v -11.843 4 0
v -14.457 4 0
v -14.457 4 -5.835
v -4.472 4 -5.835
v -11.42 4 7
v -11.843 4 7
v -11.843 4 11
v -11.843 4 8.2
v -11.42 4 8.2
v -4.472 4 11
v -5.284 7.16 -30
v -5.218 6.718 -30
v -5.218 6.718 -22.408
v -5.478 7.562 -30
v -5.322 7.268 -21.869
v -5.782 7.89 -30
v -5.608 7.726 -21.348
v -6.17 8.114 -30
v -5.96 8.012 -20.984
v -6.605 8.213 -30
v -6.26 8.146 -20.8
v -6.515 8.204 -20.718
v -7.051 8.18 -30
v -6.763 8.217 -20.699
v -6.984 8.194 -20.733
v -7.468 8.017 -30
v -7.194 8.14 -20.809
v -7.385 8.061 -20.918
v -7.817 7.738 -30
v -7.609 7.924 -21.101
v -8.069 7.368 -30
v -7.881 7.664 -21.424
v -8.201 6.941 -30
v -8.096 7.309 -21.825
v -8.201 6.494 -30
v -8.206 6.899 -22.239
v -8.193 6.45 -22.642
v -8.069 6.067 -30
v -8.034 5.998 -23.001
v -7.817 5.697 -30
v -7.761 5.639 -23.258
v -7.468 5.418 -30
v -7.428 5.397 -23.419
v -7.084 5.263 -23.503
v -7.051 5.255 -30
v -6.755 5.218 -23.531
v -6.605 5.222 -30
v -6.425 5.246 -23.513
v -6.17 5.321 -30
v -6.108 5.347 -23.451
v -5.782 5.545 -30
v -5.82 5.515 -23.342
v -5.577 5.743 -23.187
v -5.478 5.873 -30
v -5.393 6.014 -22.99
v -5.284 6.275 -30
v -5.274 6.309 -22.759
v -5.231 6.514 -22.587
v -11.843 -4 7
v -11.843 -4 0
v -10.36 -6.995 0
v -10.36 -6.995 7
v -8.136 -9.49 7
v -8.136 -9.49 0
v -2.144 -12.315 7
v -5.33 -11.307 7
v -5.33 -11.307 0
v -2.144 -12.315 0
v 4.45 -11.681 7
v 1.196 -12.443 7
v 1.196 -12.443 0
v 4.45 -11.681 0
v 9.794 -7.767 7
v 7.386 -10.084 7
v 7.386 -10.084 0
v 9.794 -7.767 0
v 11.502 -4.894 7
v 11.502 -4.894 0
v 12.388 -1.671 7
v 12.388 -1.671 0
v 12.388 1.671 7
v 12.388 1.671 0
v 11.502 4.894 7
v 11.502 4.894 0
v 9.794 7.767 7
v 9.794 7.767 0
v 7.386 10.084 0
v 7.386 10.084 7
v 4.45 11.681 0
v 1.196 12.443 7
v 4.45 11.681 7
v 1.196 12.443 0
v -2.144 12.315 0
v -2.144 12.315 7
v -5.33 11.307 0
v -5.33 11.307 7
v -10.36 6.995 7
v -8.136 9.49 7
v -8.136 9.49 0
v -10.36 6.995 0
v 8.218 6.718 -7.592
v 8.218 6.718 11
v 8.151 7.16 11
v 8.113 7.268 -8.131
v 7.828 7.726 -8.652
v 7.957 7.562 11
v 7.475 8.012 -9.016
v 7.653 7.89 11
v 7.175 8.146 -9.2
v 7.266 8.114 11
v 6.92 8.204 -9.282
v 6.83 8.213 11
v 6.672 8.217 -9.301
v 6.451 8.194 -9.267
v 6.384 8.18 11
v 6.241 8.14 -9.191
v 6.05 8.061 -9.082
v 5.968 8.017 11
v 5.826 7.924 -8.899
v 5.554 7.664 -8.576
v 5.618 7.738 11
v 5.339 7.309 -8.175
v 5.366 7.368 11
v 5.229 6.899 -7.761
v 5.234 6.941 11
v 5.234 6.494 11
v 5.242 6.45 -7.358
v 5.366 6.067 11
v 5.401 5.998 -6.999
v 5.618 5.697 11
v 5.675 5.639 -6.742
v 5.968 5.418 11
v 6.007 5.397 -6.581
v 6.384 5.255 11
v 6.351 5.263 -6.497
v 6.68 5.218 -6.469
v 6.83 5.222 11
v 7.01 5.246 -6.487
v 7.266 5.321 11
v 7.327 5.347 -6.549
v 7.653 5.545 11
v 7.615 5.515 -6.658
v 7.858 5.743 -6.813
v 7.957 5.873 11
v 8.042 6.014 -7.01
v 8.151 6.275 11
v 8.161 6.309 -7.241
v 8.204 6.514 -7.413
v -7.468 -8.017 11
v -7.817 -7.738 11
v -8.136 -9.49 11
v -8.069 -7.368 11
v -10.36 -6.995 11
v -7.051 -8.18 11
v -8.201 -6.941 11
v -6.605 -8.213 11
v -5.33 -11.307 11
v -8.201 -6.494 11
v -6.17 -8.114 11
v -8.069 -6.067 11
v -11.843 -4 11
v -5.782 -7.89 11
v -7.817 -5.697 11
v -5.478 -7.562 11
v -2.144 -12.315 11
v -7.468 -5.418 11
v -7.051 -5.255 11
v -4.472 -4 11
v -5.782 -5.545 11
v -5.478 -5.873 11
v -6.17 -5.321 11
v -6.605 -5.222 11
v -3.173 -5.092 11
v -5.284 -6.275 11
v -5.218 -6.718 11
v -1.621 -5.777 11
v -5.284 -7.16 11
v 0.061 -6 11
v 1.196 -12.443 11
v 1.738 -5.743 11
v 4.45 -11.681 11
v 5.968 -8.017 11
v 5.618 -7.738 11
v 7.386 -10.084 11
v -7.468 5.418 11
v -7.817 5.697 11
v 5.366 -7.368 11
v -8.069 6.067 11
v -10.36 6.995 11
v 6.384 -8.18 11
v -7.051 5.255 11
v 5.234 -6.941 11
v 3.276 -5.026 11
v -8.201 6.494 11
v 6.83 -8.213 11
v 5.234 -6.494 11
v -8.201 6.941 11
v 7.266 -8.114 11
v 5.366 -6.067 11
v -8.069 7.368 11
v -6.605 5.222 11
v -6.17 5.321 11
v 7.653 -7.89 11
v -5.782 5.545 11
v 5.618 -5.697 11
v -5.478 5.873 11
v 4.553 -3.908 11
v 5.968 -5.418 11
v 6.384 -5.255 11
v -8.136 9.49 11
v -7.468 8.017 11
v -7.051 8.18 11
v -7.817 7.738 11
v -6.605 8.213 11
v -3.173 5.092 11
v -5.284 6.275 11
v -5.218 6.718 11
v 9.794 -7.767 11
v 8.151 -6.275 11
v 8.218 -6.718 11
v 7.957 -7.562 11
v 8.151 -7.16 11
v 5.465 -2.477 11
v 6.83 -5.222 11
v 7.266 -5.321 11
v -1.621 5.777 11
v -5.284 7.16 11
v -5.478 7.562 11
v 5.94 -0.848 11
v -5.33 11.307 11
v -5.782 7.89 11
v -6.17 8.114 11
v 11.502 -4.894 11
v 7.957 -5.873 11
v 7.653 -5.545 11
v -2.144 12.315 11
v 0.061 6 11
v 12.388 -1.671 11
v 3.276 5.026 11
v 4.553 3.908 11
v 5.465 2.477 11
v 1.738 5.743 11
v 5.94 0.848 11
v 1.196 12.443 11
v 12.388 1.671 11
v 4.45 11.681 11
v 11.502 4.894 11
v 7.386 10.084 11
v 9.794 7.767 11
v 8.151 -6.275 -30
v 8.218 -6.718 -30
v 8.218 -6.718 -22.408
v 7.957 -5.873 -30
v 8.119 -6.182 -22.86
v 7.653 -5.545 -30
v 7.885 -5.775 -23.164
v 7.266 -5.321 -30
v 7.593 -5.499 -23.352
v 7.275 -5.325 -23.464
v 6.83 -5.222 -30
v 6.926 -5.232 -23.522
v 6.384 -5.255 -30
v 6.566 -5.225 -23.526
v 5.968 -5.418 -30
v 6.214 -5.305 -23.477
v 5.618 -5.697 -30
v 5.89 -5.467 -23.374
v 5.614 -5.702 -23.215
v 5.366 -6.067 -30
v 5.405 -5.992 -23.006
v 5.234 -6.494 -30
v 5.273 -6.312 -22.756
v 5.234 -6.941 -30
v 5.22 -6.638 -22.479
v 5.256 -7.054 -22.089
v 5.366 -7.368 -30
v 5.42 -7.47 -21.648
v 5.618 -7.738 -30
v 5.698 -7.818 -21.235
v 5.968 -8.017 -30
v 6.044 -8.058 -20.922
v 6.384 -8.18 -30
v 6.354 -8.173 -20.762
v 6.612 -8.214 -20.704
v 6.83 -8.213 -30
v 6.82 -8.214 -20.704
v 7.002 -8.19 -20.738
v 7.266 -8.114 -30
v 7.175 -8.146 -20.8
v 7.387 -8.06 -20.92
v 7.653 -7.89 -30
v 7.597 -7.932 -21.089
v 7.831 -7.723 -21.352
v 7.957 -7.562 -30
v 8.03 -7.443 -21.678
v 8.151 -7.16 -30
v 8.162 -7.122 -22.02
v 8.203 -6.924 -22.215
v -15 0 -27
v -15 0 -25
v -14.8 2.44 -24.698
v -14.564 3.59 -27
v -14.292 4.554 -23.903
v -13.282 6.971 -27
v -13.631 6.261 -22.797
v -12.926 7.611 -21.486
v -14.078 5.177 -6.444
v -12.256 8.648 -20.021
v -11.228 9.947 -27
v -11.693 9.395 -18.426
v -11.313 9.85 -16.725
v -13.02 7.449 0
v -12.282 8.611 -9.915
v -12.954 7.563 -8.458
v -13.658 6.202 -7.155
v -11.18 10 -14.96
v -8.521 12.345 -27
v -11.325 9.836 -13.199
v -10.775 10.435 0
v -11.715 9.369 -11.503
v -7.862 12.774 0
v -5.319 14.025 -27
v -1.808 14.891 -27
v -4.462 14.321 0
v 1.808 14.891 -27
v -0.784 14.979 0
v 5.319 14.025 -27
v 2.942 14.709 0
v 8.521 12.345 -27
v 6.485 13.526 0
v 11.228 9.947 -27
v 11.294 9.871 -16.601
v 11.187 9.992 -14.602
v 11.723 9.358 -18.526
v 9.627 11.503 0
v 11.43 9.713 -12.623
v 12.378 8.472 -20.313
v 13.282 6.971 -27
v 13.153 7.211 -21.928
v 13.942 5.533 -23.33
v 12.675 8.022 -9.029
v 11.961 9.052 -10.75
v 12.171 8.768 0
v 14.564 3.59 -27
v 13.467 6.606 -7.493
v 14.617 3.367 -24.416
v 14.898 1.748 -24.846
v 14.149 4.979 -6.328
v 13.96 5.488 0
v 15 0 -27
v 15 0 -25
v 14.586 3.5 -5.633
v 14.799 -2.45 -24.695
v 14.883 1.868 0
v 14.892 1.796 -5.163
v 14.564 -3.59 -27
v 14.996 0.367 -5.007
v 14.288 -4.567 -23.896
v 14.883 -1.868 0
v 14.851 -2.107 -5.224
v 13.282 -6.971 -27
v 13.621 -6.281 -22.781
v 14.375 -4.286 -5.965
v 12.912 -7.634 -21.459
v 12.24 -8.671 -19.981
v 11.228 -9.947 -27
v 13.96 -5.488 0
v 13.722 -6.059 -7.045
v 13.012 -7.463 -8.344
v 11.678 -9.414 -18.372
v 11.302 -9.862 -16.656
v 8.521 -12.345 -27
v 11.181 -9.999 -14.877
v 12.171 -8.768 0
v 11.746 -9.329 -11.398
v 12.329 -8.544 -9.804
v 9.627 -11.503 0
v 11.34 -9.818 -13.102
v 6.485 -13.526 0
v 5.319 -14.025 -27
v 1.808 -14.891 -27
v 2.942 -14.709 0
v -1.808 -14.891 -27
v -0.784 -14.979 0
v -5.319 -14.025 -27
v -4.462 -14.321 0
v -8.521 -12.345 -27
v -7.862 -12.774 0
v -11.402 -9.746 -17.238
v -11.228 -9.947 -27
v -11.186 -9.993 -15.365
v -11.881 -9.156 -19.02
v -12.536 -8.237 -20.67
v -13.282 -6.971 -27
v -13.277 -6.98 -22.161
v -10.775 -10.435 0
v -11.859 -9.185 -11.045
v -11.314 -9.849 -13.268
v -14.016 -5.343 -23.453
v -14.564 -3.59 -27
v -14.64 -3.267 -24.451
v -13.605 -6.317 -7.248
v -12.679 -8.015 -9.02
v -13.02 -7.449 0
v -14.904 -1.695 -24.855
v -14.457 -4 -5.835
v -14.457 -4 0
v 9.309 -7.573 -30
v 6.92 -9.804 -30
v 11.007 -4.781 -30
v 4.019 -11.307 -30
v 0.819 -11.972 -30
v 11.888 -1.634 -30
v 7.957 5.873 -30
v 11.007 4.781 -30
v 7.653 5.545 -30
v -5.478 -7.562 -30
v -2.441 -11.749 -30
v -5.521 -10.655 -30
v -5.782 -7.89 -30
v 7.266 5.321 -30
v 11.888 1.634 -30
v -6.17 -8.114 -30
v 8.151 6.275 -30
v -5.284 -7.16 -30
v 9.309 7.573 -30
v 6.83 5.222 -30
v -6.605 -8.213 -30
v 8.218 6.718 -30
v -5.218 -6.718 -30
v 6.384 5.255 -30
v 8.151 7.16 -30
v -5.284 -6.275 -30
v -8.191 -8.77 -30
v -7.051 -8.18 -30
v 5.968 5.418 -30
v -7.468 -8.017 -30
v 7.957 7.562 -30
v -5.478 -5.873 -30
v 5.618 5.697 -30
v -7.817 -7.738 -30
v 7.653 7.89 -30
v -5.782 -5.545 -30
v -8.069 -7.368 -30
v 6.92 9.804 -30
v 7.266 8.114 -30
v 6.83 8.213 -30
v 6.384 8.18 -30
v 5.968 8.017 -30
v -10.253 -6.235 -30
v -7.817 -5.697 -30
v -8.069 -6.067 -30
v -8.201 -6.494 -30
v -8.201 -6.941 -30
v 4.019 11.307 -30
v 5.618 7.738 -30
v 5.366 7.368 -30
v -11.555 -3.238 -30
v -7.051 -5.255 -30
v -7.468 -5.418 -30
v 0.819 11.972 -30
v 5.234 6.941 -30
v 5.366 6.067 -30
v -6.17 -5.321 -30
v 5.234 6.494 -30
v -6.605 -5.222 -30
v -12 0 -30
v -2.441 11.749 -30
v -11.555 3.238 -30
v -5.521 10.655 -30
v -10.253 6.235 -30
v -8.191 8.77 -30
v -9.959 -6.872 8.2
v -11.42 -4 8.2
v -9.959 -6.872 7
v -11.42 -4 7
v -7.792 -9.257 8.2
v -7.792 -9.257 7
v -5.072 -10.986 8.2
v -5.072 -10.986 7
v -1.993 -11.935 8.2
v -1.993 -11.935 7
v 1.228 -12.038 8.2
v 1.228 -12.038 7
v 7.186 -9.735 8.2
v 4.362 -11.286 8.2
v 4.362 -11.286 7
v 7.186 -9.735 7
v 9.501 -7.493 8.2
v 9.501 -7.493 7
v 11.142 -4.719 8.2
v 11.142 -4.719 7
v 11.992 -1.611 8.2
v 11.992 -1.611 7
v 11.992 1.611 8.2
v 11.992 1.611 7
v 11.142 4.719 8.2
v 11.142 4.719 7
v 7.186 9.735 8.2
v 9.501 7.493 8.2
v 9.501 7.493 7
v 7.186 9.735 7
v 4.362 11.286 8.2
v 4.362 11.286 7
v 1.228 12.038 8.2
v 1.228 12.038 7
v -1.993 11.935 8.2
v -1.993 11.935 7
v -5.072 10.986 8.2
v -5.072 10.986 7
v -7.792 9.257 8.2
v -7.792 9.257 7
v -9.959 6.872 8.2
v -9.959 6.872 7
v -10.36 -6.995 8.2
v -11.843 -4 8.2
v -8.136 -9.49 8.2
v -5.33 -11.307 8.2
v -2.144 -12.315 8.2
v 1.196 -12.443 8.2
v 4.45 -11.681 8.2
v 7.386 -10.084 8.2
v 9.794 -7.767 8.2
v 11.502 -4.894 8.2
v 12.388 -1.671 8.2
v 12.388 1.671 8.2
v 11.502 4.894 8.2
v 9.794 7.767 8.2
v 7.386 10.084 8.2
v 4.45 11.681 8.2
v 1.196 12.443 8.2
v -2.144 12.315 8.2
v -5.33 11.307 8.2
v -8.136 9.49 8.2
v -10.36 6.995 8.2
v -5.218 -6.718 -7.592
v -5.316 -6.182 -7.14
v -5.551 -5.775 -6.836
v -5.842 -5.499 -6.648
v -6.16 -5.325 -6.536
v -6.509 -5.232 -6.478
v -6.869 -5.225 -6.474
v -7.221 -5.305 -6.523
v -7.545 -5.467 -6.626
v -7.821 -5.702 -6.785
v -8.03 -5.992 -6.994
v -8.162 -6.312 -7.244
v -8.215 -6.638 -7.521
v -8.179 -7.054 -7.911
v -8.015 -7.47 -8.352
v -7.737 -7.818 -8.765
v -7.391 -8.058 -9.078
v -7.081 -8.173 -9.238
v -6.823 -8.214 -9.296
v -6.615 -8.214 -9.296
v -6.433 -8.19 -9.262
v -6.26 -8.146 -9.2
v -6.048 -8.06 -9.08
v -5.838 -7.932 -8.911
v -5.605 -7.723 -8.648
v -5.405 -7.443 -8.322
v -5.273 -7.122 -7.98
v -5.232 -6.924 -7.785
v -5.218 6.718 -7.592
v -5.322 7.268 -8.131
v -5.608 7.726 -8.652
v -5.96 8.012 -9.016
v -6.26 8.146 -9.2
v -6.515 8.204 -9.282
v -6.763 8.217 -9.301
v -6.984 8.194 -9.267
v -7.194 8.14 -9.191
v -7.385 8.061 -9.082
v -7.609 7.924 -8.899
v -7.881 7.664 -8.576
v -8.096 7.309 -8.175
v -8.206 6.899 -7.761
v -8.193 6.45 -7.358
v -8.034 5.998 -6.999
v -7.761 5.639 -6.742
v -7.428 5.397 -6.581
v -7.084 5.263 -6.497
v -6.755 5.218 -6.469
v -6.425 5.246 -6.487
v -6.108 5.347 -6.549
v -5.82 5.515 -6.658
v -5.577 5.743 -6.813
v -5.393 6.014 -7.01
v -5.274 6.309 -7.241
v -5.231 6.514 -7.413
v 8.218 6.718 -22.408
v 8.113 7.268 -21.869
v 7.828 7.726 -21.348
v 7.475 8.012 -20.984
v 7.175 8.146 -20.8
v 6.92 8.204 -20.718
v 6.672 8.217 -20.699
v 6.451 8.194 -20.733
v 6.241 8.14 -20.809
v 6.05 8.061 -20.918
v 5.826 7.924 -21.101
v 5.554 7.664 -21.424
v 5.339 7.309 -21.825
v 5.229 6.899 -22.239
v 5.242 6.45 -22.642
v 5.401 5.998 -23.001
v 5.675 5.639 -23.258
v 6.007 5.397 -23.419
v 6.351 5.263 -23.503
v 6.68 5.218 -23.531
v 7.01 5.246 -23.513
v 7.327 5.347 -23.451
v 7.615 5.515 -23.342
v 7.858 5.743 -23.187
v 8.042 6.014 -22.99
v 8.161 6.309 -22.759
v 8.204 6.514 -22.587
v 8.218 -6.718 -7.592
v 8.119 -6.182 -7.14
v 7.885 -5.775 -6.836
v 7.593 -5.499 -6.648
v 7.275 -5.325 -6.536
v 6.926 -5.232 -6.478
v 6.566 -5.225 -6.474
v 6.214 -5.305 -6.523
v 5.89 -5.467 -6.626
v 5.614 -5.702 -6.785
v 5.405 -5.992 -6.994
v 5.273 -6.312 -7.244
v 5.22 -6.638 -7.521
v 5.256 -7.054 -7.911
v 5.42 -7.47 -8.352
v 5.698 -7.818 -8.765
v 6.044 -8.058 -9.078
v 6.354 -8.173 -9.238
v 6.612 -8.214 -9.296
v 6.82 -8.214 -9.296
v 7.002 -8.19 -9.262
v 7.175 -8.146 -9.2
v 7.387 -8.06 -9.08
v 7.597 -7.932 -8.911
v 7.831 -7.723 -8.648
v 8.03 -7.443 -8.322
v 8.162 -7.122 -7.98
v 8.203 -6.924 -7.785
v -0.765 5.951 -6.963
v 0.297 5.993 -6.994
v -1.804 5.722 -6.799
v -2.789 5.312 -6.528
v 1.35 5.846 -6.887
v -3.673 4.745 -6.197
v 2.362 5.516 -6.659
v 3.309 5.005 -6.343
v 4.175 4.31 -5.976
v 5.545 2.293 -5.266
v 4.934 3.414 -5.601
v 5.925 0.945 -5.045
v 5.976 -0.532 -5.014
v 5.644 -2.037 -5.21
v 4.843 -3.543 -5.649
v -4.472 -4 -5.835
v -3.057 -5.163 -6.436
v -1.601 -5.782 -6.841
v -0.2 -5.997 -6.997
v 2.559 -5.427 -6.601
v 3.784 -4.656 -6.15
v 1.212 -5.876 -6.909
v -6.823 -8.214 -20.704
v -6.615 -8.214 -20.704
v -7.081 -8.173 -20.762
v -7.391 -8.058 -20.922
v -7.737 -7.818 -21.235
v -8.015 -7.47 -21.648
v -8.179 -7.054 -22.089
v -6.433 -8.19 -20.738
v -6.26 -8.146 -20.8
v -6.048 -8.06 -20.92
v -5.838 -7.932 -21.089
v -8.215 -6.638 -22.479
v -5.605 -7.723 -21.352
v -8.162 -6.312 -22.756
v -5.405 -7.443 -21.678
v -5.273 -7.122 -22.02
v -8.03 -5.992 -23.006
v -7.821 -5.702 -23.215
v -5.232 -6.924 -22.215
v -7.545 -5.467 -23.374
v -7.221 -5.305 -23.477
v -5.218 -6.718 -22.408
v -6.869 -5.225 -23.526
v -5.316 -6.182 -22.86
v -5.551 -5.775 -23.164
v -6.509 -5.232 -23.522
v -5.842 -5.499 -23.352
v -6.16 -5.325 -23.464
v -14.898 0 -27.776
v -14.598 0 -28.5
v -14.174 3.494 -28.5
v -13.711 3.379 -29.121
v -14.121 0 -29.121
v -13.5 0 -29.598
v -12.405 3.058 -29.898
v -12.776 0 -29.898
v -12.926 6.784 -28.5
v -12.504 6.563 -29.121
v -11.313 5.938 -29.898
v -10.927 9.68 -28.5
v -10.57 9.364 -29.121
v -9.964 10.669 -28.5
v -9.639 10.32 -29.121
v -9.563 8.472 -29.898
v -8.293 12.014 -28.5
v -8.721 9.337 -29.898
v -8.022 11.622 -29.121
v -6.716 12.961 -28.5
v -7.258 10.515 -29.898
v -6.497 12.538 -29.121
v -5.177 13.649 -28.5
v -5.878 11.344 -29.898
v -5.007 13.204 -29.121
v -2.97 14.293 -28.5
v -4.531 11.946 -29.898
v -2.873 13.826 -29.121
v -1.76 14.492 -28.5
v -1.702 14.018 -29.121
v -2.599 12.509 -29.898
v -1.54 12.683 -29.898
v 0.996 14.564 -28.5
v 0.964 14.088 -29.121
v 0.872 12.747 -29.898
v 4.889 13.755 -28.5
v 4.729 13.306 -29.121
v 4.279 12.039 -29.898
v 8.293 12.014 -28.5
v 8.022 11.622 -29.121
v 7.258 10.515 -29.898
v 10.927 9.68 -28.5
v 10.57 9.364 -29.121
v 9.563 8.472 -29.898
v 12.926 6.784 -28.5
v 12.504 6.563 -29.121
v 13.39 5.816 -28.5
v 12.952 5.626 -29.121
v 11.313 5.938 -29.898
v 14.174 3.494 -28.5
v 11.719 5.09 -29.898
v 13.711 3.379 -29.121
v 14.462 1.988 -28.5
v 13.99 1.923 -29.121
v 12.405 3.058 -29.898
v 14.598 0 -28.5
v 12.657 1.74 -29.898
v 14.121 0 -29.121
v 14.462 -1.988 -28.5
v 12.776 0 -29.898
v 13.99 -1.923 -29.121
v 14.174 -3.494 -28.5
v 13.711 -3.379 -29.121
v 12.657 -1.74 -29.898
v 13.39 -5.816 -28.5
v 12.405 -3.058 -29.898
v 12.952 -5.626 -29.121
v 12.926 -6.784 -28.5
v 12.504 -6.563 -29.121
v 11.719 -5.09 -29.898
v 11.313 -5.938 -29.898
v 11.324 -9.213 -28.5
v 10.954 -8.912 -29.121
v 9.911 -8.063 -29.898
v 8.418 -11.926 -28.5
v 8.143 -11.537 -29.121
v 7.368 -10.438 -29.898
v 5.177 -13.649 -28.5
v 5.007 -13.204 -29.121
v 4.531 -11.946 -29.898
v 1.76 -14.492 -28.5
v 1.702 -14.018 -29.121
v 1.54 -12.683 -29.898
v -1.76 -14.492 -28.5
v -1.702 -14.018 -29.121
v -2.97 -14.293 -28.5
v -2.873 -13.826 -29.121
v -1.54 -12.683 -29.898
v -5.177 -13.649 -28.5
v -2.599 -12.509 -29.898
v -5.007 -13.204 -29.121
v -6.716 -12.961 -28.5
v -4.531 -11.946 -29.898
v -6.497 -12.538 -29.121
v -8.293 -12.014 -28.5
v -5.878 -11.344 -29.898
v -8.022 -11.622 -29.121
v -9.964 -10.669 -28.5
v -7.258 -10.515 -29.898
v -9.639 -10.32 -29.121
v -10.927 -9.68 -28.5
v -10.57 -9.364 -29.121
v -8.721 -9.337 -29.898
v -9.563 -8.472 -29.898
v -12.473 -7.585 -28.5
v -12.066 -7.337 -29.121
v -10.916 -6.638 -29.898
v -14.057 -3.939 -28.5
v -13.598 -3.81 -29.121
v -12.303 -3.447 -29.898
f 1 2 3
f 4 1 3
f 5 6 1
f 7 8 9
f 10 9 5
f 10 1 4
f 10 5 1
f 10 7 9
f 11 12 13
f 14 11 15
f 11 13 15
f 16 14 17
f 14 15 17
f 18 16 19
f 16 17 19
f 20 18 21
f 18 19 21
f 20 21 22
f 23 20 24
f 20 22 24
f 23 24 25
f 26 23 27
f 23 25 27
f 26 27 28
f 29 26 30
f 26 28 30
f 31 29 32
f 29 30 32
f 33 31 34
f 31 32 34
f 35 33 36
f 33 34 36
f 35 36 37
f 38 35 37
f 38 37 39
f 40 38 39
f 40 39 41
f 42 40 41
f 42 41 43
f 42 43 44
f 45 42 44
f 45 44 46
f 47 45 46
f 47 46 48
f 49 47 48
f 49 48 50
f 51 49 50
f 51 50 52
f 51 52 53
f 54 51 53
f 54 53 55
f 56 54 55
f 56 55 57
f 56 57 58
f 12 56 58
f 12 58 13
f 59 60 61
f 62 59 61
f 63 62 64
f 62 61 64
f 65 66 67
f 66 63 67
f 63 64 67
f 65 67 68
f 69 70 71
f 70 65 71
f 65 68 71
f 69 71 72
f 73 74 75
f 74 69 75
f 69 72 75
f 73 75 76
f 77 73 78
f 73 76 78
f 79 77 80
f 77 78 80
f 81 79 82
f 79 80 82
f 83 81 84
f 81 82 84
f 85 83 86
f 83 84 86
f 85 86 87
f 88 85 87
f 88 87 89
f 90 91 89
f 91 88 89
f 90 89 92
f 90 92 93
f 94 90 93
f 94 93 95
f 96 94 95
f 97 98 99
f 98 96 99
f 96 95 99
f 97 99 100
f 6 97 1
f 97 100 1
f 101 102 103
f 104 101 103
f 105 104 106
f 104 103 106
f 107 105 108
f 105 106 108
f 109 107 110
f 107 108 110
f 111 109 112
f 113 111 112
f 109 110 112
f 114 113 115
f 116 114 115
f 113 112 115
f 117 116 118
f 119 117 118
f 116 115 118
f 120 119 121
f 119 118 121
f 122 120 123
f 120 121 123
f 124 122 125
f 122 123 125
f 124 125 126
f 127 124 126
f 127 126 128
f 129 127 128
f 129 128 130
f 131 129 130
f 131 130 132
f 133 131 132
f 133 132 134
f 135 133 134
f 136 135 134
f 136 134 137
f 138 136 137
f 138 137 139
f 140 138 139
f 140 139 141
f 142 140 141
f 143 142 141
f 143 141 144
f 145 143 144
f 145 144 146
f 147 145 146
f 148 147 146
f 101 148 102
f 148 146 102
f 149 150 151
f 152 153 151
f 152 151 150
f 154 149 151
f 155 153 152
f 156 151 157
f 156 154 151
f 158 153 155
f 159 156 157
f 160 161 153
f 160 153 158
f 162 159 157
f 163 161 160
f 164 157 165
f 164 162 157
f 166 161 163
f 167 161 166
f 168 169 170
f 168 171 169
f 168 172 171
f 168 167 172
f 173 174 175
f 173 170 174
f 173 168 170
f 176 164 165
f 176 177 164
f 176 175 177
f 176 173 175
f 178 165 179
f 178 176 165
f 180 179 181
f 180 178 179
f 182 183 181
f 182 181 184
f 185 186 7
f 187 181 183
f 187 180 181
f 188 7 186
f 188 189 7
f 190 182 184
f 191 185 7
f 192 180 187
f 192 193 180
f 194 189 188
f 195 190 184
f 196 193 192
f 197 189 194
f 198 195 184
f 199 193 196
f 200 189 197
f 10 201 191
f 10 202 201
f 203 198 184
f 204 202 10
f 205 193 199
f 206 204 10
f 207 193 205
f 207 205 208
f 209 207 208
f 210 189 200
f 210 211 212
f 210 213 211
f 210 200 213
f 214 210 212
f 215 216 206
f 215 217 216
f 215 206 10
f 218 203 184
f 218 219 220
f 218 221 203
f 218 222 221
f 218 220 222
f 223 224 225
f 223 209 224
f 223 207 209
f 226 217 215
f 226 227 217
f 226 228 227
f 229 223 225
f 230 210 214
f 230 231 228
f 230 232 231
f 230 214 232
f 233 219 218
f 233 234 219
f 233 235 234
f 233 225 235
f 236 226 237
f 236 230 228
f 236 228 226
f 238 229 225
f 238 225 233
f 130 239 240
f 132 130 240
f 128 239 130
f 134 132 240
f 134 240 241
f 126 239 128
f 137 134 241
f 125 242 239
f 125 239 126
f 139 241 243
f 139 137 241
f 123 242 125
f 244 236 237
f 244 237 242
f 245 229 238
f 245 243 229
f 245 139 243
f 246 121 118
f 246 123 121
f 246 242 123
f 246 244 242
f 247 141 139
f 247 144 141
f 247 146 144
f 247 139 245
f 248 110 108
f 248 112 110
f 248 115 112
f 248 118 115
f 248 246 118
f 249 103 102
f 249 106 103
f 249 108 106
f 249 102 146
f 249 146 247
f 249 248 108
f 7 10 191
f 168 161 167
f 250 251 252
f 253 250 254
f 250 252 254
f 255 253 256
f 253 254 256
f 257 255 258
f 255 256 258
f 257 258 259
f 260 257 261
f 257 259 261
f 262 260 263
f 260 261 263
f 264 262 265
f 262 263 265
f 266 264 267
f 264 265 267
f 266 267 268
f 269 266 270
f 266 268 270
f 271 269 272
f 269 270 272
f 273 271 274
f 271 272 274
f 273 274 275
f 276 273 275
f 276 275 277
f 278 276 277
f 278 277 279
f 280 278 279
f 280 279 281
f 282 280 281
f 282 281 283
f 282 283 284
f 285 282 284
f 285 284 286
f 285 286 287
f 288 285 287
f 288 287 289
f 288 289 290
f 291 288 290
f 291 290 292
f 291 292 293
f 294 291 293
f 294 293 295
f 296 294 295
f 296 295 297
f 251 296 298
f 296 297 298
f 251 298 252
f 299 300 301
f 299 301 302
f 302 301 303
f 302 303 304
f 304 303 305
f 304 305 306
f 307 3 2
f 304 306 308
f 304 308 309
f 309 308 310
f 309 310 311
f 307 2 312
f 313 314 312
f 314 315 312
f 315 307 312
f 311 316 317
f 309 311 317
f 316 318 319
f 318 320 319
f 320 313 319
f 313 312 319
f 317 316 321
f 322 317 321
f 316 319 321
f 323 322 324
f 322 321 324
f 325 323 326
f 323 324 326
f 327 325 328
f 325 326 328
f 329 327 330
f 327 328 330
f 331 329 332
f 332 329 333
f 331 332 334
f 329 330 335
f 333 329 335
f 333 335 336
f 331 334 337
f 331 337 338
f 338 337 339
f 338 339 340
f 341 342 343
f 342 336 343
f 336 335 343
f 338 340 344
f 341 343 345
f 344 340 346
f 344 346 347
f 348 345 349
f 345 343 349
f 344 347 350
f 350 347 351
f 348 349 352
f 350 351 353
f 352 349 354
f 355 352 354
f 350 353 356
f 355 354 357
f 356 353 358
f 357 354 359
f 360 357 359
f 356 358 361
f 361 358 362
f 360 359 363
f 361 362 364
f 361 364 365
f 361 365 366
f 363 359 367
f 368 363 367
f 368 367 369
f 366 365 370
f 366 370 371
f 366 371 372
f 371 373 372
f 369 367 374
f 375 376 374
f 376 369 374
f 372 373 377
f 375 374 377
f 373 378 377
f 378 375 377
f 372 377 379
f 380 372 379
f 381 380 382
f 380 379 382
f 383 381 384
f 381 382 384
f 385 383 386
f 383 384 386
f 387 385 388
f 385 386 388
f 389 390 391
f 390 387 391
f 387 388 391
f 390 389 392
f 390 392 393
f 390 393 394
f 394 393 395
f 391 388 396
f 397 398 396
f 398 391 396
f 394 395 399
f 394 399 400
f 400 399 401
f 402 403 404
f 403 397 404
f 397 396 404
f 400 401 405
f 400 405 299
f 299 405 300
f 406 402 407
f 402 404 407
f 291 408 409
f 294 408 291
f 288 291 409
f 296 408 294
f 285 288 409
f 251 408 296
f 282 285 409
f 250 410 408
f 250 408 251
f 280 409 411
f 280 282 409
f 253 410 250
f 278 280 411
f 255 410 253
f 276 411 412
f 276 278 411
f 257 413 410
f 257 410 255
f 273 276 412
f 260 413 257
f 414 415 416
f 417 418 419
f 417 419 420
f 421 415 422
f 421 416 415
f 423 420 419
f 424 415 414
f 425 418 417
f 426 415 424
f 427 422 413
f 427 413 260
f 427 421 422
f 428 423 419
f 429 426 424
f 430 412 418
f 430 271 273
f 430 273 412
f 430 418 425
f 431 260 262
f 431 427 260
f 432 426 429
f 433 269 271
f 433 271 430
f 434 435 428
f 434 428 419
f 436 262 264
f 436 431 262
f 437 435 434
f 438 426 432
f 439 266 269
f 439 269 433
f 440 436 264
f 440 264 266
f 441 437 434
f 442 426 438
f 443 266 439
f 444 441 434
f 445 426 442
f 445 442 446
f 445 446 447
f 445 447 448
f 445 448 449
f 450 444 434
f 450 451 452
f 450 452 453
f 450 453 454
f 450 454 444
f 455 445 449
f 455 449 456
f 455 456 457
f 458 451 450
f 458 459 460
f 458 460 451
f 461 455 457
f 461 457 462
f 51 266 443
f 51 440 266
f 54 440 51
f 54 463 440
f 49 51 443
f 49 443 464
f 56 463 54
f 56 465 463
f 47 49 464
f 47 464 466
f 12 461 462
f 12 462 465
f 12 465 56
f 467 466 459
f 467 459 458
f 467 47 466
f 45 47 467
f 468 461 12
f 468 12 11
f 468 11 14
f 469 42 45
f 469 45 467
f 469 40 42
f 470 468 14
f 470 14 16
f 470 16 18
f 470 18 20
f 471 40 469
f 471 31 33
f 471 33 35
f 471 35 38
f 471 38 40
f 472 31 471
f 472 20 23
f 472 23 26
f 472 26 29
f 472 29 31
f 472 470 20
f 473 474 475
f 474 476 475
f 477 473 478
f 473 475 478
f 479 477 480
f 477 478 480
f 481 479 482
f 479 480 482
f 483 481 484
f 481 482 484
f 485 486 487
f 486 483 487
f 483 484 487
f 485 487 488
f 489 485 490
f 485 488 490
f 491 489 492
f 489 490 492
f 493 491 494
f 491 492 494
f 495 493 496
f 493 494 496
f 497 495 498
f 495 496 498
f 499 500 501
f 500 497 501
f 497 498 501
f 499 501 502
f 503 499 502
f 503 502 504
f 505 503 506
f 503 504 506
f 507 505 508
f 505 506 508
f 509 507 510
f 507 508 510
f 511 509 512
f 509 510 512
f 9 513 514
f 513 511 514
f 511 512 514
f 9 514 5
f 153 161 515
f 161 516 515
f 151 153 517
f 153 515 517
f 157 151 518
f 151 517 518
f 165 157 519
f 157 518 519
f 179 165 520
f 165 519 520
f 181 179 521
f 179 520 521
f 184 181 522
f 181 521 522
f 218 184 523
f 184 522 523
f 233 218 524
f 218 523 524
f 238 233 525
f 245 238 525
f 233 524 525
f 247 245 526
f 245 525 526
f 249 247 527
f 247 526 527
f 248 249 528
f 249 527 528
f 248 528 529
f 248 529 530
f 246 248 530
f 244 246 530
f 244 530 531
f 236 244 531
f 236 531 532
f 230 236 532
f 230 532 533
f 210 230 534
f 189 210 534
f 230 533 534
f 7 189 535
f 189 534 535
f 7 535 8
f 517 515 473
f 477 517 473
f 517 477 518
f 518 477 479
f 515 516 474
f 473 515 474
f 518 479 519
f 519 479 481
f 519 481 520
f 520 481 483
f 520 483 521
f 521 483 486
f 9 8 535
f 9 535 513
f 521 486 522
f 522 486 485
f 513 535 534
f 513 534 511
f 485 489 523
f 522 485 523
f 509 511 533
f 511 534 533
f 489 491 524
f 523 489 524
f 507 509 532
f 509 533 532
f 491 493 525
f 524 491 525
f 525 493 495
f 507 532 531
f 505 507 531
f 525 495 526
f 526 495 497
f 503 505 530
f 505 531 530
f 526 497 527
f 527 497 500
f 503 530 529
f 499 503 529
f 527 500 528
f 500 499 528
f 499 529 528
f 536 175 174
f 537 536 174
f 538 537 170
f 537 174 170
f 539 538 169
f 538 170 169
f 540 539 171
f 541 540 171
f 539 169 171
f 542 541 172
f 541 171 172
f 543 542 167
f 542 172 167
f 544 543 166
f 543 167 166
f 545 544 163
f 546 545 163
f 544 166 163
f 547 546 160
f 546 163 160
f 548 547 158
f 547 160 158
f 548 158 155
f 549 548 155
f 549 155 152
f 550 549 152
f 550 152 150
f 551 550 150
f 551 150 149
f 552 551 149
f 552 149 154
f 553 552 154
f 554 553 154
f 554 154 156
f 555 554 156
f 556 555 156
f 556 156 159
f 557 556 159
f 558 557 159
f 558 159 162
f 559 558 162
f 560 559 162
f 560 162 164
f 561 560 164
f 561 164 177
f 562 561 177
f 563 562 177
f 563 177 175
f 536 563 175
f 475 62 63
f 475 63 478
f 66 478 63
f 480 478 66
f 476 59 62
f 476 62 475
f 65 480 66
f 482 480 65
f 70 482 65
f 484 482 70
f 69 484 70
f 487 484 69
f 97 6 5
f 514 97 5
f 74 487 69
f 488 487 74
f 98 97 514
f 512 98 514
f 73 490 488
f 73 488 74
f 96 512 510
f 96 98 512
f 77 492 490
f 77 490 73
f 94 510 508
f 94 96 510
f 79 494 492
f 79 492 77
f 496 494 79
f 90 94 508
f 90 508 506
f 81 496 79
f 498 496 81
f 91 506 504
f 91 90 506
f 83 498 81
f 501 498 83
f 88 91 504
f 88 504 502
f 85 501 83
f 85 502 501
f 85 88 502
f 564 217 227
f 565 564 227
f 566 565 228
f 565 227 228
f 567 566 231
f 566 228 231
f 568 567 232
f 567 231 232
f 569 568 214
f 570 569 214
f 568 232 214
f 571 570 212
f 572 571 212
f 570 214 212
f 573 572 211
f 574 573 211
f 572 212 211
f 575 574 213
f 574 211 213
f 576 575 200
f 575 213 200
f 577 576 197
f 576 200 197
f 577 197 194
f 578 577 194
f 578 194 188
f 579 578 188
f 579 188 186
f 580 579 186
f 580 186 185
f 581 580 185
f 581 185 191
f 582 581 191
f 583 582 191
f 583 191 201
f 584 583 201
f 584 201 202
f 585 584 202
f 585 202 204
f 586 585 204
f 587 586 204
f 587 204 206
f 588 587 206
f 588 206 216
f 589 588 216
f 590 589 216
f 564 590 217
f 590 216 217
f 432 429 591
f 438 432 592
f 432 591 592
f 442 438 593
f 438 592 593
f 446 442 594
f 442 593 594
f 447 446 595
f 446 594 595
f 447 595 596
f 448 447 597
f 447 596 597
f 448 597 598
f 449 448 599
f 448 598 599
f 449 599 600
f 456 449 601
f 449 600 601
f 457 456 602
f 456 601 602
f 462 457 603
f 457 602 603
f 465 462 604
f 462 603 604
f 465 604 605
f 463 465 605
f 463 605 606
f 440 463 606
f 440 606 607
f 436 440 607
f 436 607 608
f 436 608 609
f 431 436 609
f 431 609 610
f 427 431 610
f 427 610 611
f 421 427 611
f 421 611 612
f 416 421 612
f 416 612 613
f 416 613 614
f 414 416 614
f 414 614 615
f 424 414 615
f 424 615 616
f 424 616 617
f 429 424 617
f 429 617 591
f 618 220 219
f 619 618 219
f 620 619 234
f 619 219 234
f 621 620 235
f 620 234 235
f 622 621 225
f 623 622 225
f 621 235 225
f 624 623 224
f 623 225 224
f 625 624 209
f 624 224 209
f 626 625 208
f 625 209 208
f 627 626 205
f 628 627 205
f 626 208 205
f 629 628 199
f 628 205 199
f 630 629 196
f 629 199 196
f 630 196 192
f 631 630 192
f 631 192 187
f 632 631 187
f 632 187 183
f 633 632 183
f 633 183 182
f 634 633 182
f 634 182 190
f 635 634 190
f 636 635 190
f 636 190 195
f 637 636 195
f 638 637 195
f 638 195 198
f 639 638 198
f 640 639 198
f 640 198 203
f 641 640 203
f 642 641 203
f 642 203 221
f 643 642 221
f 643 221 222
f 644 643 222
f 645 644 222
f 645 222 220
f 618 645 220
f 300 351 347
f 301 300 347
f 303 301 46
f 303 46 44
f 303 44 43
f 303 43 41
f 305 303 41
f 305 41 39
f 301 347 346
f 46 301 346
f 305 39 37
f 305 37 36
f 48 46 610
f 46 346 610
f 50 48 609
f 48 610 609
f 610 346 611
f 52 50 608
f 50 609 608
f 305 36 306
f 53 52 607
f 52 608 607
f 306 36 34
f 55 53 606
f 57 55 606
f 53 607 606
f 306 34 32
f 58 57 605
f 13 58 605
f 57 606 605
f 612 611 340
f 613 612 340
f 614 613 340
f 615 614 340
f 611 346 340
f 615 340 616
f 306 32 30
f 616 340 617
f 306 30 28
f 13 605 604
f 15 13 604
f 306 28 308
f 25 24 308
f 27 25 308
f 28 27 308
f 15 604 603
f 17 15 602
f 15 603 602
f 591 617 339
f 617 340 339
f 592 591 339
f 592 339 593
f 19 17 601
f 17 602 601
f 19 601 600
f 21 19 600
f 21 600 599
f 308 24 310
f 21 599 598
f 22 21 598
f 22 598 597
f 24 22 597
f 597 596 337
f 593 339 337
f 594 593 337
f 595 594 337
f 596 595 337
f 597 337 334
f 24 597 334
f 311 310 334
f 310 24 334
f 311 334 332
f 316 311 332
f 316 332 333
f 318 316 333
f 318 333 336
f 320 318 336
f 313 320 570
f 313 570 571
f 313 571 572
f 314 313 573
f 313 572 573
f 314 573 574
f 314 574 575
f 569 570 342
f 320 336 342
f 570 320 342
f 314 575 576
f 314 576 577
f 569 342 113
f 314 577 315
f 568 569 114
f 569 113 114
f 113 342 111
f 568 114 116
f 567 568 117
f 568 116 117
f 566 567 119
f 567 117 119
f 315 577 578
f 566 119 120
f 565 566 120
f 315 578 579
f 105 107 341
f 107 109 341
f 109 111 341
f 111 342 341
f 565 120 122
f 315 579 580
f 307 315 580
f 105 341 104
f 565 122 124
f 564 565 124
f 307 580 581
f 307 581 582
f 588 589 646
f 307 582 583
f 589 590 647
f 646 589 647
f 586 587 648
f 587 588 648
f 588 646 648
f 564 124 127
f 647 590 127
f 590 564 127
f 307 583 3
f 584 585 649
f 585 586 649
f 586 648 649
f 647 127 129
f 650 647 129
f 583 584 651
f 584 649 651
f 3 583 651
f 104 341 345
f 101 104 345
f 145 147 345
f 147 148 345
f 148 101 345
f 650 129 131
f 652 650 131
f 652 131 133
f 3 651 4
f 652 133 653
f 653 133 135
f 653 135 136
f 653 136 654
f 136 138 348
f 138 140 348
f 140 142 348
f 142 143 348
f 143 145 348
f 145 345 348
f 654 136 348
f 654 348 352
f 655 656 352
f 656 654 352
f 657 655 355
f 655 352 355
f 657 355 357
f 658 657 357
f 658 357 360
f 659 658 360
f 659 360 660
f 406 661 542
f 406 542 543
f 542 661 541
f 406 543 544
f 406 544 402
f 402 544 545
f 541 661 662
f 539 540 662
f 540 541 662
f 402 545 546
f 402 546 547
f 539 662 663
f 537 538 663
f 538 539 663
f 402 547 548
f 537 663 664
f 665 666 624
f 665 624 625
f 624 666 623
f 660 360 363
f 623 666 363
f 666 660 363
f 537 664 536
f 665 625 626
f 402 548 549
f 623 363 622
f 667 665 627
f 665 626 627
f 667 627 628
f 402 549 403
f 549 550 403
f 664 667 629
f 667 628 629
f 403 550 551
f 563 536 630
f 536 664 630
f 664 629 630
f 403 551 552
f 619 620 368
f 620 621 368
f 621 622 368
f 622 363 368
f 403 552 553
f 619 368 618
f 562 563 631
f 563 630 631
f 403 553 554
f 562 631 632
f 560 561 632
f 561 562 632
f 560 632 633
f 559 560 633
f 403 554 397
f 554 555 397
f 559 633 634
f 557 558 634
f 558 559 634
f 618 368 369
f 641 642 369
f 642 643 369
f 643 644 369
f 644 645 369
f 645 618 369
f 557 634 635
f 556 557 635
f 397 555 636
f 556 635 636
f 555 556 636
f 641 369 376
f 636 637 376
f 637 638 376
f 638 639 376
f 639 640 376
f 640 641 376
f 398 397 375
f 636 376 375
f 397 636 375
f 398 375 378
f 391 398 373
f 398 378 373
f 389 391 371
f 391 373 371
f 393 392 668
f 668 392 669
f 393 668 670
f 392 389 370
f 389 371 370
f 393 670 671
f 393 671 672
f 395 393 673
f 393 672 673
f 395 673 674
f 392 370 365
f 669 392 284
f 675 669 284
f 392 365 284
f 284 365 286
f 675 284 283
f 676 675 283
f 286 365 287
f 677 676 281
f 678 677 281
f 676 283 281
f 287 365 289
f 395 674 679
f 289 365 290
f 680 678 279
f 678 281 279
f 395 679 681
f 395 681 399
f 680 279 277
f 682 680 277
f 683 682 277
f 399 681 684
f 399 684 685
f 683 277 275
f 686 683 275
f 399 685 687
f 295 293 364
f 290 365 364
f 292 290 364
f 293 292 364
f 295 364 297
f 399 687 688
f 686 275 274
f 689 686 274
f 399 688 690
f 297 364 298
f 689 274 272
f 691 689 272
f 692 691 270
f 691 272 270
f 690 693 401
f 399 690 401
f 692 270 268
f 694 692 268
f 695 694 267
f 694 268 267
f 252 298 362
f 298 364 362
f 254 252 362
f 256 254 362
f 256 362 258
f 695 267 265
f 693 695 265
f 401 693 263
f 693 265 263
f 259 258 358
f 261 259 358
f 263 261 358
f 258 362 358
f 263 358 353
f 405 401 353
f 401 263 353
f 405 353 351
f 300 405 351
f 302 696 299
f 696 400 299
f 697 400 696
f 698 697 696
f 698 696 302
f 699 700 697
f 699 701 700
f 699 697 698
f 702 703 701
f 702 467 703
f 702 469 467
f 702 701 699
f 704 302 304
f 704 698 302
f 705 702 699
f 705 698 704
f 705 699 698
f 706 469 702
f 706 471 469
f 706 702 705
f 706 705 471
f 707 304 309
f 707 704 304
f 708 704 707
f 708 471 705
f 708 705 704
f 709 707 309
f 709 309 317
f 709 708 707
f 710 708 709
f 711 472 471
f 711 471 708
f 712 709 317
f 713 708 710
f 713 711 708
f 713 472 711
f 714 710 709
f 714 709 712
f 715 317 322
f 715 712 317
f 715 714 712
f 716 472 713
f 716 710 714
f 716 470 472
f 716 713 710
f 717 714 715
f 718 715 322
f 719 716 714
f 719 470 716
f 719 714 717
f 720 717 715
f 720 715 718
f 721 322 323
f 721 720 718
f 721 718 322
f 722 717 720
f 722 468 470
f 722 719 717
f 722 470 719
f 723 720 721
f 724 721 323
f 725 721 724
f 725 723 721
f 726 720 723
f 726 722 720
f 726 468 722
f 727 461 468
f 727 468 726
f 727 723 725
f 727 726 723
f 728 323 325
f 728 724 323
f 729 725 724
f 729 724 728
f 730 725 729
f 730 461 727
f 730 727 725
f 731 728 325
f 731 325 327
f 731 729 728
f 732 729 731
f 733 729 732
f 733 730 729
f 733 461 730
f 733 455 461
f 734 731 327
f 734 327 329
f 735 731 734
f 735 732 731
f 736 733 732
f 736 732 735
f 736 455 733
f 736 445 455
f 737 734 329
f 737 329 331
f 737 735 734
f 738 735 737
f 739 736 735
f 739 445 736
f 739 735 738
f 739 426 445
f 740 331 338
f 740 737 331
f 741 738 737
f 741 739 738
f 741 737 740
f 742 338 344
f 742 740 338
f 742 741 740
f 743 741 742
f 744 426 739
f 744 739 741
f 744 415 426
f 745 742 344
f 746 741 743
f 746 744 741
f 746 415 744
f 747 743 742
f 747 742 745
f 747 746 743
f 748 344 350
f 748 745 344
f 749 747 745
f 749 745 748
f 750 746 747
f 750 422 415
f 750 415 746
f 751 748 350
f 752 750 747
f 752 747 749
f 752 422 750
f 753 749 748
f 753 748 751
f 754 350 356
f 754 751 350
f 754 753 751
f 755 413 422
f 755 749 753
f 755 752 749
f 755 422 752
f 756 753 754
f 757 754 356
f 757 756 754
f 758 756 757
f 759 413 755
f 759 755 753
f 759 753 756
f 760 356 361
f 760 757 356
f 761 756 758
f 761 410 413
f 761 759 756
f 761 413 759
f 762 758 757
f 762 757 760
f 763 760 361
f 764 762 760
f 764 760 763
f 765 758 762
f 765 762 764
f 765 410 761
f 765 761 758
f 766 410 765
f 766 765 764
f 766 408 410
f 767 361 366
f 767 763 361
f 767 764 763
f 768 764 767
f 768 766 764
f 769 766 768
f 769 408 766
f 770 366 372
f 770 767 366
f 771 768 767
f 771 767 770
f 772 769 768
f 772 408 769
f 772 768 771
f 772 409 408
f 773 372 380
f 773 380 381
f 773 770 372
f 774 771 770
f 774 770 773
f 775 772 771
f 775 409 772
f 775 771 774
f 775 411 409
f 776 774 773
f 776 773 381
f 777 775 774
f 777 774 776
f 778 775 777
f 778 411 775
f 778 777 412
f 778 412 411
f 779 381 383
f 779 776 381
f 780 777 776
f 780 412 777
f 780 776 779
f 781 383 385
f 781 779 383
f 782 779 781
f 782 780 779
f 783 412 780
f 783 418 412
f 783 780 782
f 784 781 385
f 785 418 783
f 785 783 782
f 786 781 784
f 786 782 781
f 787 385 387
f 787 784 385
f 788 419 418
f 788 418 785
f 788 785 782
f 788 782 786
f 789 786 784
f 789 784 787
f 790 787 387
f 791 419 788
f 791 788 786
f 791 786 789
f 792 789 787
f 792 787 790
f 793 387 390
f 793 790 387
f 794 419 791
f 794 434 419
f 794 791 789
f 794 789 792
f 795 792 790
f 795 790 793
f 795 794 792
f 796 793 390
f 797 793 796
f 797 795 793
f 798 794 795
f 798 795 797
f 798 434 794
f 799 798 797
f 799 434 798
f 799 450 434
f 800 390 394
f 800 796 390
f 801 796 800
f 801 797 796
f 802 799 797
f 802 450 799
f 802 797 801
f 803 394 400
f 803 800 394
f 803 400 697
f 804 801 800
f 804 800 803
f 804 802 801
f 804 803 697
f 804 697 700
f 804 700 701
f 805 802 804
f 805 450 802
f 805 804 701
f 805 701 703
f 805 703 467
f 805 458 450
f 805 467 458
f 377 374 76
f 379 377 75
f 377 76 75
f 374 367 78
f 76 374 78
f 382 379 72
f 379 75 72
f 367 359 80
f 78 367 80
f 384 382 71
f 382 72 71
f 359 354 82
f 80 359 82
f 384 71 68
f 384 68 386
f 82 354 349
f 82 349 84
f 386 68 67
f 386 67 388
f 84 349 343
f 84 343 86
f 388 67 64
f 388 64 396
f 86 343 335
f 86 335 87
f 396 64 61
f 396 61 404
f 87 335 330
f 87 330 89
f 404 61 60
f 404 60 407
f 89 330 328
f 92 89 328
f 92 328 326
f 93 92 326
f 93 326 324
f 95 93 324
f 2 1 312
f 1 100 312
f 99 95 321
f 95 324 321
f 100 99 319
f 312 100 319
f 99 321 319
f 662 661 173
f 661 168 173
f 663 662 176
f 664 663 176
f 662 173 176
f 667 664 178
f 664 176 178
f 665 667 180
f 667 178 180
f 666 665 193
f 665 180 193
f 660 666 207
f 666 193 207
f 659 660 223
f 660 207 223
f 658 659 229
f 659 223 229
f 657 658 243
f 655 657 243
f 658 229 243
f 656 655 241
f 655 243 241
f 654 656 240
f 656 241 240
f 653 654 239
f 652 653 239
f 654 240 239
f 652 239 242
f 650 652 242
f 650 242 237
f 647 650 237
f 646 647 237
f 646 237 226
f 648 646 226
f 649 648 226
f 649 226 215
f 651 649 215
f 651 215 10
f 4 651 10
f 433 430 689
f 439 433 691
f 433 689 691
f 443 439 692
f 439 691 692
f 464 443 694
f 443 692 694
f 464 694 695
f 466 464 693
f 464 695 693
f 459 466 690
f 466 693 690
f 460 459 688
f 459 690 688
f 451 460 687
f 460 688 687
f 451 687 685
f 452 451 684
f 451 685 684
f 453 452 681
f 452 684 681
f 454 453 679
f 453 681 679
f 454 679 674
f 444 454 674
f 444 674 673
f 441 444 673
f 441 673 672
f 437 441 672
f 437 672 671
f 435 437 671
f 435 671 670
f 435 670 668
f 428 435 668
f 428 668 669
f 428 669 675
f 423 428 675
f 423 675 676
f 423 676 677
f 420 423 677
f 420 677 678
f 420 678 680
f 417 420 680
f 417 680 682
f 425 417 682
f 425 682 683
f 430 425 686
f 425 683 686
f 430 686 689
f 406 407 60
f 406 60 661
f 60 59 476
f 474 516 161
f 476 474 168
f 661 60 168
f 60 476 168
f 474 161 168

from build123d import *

# Parameters (mm, degrees)
SKETCH_1_R          = 12.5
EXTRUDE_1_DEPTH     = 8
SKETCH_2_R          = 15
EXTRUDE_2_DEPTH     = 30
SKETCH_3_R          = 10
CUT_EXTRUDE_1_DEPTH = 15
SKETCH_5_R          = 12.5
EXTRUDE_3_DEPTH     = 3
SKETCH_6_R          = 12.5
SKETCH_6_R_2        = 12.1
CUT_EXTRUDE_2_DEPTH = 1.2
EXTRUDE_START       = 2
SKETCH_9_R          = 15
SKETCH_9_R_2        = 12.5
EXTRUDE_4_DEPTH     = 2
SKETCH_12_R         = 1.5
CUT_EXTRUDE_6_DEPTH = 47.162755705
SKETCH_13_R         = 6
CUT_EXTRUDE_7_DEPTH = 20
SKETCH_14_W         = 23.536155202
SKETCH_14_H         = 8
CUT_EXTRUDE_8_DEPTH = 20
FILLET_1_R          = 3


with BuildPart() as part:
    # 草图1 → 凸台-拉伸1 (new body)
    with BuildSketch(Plane.XY):
        Circle(SKETCH_1_R)
    extrude(amount=EXTRUDE_1_DEPTH)

    # 草图2 → 凸台-拉伸2 (add)
    with BuildSketch(Plane(origin=(0, 0, 0), x_dir=(-1, 0, 0), z_dir=(0, 0, -1))):
        Circle(SKETCH_2_R)
    extrude(amount=EXTRUDE_2_DEPTH)

    # 草图3 → 切除-拉伸1 (cut, symmetric)
    with BuildSketch(Plane(origin=(0, 0, 0), x_dir=(0, 0, -1), z_dir=(1, 0, 0))):
        with Locations((15, 0)):
            Circle(SKETCH_3_R)
    extrude(amount=CUT_EXTRUDE_1_DEPTH, both=True, mode=Mode.SUBTRACT)

    # 草图5 → 凸台-拉伸3 (add)
    with BuildSketch(Plane.XY.offset(8)):
        Circle(SKETCH_5_R)
    extrude(amount=EXTRUDE_3_DEPTH)

    # 草图6 → 切除-拉伸2 (cut)
    with BuildSketch(Plane.XY.offset(7)):
        Circle(SKETCH_6_R)
        Circle(SKETCH_6_R_2, mode=Mode.SUBTRACT)
    extrude(amount=CUT_EXTRUDE_2_DEPTH, mode=Mode.SUBTRACT)

    # 草图9 → 凸台-拉伸4 (add)
    with BuildSketch(Plane(origin=(0, 0, 0), x_dir=(-1, 0, 0), z_dir=(0, 0, -1)).offset(EXTRUDE_START)):
        Circle(SKETCH_9_R)
        with Locations(Location((0, 0, 0), (0, 0, 180))):
            Circle(SKETCH_9_R_2, mode=Mode.SUBTRACT)
    extrude(amount=-EXTRUDE_4_DEPTH)

    # 草图12 → 切除-拉伸6 (cut, through all)
    with BuildSketch(Plane.XY.offset(11)):
        with Locations((6.717514421, 6.717514421)):
            Circle(SKETCH_12_R)
        with Locations((6.717514421, -6.717514421)):
            Circle(SKETCH_12_R)
        with Locations((-6.717514421, -6.717514421)):
            Circle(SKETCH_12_R)
        with Locations((-6.717514421, 6.717514421)):
            Circle(SKETCH_12_R)
    extrude(amount=-CUT_EXTRUDE_6_DEPTH, mode=Mode.SUBTRACT)

    # 草图13 → 切除-拉伸7 (cut)
    with BuildSketch(Plane.XY.offset(11)):
        Circle(SKETCH_13_R)
    extrude(amount=-CUT_EXTRUDE_7_DEPTH, mode=Mode.SUBTRACT)

    # 草图14 → 切除-拉伸8 (cut)
    with BuildSketch(Plane.XY.offset(11)):
        with Locations((-12.5, 0)):
            Rectangle(SKETCH_14_W, SKETCH_14_H)
    extrude(amount=-CUT_EXTRUDE_8_DEPTH, mode=Mode.SUBTRACT)

    # 圆角1
    fillet_1_edges = [part.edges().sort_by_distance(p)[0] for p in [
        (15, 0, -30),
    ]]
    fillet(fillet_1_edges, radius=FILLET_1_R)


solid = part.part
